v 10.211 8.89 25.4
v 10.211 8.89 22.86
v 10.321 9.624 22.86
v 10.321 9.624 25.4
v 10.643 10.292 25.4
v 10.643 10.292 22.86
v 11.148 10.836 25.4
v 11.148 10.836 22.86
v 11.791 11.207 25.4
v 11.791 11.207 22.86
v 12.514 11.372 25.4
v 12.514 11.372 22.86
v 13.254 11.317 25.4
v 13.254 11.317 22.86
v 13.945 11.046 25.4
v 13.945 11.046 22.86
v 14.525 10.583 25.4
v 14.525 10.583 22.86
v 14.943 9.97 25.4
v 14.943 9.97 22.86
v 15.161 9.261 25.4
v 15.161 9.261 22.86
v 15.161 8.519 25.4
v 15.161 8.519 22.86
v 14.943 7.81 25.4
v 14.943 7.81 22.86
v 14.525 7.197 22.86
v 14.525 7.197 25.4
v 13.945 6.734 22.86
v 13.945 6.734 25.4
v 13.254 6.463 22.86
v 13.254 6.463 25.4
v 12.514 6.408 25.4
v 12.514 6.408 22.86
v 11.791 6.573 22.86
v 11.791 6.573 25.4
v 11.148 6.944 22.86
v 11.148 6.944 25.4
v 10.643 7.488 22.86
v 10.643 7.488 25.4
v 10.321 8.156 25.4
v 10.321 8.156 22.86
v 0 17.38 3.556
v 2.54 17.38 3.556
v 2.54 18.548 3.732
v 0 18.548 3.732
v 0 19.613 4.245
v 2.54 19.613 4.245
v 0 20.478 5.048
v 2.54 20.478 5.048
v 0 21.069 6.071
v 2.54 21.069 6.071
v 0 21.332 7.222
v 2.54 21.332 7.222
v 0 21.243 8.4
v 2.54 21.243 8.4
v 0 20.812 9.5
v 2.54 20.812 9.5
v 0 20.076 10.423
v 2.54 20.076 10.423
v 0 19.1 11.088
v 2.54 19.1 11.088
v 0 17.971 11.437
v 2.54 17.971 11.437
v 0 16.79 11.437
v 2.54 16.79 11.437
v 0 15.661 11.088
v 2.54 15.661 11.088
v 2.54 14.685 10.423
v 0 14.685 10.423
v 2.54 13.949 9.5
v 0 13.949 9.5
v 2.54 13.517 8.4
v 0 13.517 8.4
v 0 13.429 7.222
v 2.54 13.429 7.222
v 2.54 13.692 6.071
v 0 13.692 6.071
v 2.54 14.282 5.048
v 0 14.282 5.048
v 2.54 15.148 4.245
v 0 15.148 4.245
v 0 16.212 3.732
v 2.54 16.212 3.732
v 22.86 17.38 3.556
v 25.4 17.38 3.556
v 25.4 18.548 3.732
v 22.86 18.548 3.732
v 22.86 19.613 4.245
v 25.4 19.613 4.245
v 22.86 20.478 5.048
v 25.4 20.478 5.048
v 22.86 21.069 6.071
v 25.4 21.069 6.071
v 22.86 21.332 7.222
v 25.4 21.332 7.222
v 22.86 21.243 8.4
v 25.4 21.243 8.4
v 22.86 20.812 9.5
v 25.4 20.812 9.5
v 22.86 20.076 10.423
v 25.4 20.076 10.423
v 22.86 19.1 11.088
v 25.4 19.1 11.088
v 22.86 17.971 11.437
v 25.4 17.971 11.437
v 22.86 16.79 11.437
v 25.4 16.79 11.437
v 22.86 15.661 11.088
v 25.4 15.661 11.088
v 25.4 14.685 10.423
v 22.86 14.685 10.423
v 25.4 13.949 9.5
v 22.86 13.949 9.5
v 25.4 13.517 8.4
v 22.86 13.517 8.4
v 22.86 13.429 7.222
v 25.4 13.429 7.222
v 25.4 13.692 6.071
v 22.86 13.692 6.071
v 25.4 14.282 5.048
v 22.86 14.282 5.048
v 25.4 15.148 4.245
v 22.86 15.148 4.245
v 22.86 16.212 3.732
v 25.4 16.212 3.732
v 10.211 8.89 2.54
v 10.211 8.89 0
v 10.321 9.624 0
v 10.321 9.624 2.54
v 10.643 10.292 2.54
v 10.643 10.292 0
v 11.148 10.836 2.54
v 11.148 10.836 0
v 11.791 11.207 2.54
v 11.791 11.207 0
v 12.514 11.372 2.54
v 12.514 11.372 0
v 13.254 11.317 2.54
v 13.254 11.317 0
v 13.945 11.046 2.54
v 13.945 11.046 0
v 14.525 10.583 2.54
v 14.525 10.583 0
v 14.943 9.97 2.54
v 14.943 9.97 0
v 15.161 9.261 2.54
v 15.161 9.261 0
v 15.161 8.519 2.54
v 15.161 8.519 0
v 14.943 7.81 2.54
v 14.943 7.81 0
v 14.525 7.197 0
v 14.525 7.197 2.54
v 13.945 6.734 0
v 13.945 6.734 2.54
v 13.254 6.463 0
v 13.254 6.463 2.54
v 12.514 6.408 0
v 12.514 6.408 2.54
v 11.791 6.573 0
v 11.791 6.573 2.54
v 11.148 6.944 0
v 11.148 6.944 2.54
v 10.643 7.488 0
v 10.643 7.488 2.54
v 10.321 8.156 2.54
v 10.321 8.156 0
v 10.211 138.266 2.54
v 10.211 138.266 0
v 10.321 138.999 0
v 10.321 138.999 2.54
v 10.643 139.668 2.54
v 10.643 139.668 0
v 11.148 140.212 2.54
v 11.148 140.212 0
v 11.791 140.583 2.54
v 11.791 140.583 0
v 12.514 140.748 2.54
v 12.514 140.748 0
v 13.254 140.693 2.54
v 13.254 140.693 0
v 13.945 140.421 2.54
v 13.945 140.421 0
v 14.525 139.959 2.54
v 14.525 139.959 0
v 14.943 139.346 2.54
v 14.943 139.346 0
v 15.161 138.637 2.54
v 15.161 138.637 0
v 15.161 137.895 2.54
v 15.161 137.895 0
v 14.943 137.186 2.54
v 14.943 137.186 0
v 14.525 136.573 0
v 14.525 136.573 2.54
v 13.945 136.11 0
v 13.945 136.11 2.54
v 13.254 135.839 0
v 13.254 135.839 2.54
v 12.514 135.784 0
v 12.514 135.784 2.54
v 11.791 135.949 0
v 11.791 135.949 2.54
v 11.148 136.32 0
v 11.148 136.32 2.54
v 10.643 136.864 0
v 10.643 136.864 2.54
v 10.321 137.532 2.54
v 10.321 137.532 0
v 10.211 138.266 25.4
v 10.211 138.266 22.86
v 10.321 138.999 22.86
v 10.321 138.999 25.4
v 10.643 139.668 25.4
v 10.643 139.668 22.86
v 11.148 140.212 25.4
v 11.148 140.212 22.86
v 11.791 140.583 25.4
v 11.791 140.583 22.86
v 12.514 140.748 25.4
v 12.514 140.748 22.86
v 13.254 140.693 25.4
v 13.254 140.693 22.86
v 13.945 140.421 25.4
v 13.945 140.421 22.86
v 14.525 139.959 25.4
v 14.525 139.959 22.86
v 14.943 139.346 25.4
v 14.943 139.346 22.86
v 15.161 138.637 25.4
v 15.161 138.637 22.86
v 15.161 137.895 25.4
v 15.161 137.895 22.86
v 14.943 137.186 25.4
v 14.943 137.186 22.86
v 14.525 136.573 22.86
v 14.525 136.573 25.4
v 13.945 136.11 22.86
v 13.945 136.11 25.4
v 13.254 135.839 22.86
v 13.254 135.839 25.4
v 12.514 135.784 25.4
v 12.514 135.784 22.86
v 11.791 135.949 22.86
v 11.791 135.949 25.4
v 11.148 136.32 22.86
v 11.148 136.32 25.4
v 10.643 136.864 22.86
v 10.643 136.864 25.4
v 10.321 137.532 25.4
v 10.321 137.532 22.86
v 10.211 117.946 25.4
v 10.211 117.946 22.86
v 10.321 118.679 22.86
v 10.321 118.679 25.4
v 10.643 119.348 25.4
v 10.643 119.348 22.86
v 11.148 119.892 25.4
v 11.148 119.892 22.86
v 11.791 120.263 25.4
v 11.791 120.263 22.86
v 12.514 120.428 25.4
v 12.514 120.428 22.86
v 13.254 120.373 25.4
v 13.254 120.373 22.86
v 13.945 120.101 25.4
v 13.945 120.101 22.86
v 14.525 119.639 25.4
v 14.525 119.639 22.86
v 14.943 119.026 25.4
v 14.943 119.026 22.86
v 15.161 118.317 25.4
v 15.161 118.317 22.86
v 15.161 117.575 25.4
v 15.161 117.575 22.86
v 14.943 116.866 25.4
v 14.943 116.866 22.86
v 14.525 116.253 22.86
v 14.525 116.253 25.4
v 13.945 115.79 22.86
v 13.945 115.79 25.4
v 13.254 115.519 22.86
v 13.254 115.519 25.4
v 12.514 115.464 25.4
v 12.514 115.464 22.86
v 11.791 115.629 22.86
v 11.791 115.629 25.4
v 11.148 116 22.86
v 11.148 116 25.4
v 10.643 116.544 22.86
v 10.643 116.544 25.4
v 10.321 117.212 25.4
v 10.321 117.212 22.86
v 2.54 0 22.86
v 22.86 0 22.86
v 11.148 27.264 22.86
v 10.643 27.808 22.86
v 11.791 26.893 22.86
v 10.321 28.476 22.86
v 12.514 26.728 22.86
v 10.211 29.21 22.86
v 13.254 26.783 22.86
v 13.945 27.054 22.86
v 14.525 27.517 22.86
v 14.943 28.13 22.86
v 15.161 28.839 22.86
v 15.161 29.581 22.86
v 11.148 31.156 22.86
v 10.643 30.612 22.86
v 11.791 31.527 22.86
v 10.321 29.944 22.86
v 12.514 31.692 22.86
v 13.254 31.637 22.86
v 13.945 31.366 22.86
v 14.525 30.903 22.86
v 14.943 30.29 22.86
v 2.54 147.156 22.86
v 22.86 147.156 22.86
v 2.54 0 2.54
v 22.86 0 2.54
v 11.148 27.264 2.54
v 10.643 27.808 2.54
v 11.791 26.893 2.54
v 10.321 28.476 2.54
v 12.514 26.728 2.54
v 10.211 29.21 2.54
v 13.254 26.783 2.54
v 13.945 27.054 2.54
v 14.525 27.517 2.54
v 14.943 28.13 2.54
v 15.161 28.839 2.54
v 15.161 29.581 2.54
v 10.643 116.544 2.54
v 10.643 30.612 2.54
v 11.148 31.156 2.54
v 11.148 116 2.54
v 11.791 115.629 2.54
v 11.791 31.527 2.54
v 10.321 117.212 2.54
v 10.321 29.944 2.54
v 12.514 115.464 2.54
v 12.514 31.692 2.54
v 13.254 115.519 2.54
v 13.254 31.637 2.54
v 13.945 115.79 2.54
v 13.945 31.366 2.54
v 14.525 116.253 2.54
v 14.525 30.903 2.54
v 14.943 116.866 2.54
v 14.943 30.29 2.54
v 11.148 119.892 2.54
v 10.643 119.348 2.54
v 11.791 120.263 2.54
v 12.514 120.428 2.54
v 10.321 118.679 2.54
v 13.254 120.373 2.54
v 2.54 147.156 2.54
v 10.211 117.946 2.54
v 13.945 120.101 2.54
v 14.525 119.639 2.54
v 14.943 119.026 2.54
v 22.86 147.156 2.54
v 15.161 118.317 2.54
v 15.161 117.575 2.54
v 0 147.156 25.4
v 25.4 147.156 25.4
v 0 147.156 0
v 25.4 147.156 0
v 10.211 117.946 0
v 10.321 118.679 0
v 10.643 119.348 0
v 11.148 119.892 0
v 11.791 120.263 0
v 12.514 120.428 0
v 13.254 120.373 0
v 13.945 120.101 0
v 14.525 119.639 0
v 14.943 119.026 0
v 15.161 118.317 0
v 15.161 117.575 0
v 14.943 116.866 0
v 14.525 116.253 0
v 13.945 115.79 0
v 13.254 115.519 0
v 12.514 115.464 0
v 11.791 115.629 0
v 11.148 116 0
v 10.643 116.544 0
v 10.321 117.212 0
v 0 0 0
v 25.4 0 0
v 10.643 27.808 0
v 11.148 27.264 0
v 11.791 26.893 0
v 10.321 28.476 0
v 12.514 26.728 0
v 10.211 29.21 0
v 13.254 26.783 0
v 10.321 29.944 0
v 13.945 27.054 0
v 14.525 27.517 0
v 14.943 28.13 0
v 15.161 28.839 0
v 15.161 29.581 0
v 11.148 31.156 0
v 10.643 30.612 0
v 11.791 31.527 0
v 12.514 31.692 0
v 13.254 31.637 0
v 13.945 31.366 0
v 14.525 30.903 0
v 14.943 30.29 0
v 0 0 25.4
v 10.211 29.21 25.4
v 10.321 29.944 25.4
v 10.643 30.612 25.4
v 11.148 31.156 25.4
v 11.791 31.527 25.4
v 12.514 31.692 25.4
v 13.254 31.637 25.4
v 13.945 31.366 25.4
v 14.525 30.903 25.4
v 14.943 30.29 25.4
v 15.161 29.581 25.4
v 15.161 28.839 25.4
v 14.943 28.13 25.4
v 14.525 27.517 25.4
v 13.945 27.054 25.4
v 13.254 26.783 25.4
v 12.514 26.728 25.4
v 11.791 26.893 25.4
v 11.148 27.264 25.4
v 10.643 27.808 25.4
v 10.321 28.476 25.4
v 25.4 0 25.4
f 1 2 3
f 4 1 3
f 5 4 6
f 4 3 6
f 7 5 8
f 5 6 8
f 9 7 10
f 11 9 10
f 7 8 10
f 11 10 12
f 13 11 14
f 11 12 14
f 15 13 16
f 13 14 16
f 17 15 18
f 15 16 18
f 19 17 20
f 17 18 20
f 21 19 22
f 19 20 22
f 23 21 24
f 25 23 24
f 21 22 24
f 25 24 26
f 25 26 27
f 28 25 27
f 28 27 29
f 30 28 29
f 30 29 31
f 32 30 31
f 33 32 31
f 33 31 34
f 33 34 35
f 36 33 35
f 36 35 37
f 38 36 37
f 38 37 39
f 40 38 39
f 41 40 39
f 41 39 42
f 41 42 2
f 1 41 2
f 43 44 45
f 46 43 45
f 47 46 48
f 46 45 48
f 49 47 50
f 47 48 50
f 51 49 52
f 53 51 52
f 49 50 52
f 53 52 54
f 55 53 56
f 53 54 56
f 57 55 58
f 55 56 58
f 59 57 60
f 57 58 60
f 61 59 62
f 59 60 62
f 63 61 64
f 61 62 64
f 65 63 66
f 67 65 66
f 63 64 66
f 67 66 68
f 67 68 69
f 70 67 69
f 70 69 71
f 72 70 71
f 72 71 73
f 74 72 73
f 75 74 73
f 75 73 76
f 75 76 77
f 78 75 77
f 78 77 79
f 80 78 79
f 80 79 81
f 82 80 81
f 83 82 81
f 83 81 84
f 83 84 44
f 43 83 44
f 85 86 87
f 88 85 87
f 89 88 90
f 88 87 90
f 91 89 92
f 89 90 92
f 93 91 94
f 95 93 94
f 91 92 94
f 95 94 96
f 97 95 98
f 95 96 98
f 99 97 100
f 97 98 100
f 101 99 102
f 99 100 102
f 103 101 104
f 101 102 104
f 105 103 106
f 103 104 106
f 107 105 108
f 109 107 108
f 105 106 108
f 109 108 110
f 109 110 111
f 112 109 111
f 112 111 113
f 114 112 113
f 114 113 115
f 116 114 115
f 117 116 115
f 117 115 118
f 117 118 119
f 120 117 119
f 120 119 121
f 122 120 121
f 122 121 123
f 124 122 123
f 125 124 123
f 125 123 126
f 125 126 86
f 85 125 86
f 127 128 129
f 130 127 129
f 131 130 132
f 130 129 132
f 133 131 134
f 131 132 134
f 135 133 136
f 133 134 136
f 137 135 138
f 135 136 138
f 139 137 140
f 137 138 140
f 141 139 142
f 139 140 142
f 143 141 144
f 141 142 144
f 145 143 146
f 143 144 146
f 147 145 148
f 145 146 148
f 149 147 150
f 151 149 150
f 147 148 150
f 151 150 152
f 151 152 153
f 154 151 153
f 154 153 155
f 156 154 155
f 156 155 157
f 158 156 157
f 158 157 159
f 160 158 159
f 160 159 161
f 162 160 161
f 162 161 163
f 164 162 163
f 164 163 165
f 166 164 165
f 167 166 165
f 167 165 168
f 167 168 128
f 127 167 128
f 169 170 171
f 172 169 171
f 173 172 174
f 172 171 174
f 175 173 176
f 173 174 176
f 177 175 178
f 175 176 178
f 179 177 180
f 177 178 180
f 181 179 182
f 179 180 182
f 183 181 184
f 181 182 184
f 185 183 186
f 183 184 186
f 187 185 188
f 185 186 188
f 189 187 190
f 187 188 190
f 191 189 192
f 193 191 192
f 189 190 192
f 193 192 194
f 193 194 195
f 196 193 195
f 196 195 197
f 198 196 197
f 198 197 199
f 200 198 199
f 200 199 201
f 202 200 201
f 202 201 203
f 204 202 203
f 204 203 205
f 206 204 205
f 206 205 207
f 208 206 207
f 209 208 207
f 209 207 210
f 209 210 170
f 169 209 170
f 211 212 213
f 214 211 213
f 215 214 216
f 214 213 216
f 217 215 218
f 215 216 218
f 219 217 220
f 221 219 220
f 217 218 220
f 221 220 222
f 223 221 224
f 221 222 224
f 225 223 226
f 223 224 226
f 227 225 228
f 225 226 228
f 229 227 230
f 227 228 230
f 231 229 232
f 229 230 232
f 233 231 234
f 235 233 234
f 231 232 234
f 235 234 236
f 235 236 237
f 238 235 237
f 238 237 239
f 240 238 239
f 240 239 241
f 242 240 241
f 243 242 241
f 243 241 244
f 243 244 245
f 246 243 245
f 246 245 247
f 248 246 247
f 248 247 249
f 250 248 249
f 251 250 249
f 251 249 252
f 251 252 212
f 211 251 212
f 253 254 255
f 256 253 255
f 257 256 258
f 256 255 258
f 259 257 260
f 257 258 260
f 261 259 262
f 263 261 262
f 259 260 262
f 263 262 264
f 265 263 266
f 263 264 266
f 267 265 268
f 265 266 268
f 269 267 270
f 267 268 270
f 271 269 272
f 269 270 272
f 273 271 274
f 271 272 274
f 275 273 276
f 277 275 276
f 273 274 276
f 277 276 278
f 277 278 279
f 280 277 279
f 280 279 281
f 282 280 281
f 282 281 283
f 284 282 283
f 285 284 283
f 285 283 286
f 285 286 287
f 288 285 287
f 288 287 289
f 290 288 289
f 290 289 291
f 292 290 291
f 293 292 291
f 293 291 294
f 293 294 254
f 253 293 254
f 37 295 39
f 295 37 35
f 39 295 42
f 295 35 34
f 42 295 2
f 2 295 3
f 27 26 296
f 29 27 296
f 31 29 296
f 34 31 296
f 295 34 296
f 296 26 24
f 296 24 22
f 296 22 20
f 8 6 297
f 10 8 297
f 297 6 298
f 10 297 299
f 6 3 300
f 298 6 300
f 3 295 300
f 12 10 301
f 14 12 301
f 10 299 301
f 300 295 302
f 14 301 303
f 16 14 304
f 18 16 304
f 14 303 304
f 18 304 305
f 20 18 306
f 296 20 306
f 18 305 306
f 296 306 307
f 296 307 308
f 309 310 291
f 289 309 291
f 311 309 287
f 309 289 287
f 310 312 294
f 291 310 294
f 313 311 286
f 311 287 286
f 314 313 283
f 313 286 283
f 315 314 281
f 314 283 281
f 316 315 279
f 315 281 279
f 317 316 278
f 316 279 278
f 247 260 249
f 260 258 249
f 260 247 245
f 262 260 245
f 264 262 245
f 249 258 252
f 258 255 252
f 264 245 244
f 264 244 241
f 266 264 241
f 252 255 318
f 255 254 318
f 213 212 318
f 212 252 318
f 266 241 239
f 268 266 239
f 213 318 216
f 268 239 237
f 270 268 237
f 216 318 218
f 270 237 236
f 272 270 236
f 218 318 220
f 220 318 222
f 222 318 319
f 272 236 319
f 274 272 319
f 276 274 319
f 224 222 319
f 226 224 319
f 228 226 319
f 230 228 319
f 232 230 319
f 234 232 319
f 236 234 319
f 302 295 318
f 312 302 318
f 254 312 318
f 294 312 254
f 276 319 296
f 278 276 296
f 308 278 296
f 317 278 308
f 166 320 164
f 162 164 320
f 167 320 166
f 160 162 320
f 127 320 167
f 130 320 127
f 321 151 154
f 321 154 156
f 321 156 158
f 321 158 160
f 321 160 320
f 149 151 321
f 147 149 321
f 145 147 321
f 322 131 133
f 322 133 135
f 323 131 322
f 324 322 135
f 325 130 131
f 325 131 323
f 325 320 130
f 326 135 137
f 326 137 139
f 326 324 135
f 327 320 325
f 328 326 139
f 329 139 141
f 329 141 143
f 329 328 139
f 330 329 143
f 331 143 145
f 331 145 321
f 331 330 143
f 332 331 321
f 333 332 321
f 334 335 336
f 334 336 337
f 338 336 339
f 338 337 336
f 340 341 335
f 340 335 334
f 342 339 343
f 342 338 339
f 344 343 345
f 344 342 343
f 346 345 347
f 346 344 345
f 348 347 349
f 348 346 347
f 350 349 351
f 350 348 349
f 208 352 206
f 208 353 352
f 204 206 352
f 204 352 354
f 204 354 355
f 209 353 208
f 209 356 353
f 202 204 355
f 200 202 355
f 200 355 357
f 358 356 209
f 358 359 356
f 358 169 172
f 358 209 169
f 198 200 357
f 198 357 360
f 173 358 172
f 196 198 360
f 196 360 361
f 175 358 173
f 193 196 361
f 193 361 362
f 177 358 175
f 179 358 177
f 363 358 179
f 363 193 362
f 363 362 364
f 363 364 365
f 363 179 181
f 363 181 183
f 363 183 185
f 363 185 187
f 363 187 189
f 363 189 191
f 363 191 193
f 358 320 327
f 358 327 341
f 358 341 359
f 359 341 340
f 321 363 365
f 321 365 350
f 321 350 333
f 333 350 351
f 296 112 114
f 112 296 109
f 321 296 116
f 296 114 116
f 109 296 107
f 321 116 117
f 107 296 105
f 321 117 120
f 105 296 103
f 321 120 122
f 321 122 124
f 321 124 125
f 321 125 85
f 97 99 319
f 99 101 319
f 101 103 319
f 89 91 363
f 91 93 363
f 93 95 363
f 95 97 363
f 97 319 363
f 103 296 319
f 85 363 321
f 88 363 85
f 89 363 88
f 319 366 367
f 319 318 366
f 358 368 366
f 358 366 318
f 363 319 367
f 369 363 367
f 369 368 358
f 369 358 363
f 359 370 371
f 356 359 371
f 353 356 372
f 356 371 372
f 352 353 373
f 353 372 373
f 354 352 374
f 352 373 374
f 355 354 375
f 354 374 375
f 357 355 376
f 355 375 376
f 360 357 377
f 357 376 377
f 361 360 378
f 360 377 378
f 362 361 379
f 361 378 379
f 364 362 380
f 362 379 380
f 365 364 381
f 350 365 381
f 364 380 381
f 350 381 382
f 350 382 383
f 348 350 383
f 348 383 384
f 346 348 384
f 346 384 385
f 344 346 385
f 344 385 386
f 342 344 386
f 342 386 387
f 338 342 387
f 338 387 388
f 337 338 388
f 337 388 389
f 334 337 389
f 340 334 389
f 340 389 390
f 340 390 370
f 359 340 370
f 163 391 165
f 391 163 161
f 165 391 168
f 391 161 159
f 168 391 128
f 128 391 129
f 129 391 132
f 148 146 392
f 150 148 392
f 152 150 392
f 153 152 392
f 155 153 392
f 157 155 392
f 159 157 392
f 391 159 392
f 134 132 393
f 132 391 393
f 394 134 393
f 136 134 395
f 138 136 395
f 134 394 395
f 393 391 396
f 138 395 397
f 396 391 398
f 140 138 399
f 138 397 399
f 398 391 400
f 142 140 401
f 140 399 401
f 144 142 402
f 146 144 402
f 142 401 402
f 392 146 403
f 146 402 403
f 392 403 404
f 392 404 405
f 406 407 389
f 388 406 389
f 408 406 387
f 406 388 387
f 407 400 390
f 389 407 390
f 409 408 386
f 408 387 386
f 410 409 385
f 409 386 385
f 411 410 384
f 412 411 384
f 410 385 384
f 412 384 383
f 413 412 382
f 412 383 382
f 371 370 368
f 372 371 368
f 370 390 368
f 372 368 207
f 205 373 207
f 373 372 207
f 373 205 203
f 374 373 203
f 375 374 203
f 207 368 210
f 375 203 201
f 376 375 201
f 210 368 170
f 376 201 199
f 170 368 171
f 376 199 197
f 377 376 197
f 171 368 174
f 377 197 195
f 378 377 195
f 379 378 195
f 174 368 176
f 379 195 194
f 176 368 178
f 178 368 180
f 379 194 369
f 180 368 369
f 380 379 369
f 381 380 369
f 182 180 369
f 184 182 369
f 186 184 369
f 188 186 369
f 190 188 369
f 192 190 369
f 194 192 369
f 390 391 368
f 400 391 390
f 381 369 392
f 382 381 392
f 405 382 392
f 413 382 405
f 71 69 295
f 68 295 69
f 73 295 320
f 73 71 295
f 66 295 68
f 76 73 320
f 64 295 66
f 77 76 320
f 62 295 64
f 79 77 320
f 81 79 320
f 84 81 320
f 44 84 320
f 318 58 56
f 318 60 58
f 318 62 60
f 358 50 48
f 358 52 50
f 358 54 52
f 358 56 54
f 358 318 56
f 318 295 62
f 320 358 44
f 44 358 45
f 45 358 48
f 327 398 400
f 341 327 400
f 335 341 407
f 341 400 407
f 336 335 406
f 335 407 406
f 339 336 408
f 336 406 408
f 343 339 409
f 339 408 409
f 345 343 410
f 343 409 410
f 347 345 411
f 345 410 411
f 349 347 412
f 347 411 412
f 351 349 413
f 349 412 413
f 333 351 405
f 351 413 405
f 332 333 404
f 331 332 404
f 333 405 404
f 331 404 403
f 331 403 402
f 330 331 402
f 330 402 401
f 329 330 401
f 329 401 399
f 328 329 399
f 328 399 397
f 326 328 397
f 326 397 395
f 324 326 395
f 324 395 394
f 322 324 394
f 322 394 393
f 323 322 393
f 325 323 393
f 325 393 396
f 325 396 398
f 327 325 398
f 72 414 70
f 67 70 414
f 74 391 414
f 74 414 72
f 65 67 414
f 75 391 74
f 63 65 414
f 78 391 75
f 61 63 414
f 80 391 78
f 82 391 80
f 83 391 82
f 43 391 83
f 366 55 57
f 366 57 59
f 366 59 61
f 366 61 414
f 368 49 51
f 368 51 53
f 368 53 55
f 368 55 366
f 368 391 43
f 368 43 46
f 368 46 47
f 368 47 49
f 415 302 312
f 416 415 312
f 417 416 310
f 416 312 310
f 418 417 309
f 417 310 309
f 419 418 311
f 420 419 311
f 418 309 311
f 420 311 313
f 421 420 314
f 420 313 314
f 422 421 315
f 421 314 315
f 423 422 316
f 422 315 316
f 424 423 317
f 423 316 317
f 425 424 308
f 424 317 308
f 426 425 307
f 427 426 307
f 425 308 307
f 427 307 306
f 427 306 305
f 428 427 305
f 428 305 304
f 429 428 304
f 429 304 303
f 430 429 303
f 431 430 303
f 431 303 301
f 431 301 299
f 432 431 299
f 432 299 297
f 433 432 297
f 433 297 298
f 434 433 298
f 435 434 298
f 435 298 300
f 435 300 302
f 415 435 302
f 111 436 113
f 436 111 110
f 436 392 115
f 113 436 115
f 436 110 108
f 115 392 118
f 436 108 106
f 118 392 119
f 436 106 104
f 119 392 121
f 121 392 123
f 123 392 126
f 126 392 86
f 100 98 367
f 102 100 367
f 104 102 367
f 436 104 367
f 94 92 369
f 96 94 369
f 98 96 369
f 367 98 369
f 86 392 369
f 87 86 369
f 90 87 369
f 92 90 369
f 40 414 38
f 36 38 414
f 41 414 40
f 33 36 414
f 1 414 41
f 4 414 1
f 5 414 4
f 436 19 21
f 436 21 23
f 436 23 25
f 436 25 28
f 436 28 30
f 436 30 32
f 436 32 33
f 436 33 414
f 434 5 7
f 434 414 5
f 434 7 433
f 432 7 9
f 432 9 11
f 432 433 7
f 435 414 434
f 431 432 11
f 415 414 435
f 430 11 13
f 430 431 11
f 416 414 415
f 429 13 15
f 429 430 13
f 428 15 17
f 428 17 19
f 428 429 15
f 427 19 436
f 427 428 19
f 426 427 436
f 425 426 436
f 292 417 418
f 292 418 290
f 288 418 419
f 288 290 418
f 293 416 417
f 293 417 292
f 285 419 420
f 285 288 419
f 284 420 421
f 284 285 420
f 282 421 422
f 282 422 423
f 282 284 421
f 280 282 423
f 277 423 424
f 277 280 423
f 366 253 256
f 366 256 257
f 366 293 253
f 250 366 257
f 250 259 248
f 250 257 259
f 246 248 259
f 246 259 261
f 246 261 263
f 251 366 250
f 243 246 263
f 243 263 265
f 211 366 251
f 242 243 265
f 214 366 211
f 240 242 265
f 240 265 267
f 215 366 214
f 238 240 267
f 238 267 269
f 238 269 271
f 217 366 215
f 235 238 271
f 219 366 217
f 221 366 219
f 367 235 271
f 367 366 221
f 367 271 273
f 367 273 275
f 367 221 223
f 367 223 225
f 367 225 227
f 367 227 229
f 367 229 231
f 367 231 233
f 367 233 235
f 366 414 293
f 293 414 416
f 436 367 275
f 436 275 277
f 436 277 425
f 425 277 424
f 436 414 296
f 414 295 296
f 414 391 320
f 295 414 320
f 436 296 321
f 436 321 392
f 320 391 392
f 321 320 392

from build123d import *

# Parameters (mm, degrees)
SKETCH1_W           = 25.4
SKETCH1_H           = 147.155789
BOSS_EXTRUDE1_DEPTH = 25.4
SKETCH2_W           = 20.32
SKETCH2_H           = 20.32
CUT_EXTRUDE1_DEPTH  = 148.155789
SKETCH3_R           = 2.4892
CUT_EXTRUDE2_DEPTH  = 26.4
SKETCH5_R           = 3.9624
CUT_EXTRUDE3_DEPTH  = 26.4


with BuildPart() as part:
    # Sketch1 → Boss-Extrude1 (new body)
    with BuildSketch(Plane.XY):
        with Locations((12.7, 73.5778945)):
            Rectangle(SKETCH1_W, SKETCH1_H)
    extrude(amount=BOSS_EXTRUDE1_DEPTH)

    # Sketch2 → Cut-Extrude1 (cut, through all)
    with BuildSketch(Plane(origin=(0, 147.155789, 0), x_dir=(1, 0, 0), z_dir=(0, 1, 0))):
        with Locations((12.7, -12.7)):
            Rectangle(SKETCH2_W, SKETCH2_H)
    extrude(amount=-CUT_EXTRUDE1_DEPTH, mode=Mode.SUBTRACT)

    # Sketch3 → Cut-Extrude2 (cut, through all)
    with BuildSketch(Plane(origin=(0, 0, 0), x_dir=(-1, 0, 0), z_dir=(0, 0, -1))):
        with Locations((-12.7, 138.265789)):
            Circle(SKETCH3_R)
        with Locations((-12.7, 117.945789)):
            Circle(SKETCH3_R)
        with Locations((-12.7, 29.21)):
            Circle(SKETCH3_R)
        with Locations((-12.7, 8.89)):
            Circle(SKETCH3_R)
    extrude(amount=-CUT_EXTRUDE2_DEPTH, mode=Mode.SUBTRACT)

    # Sketch5 → Cut-Extrude3 (cut, through all)
    with BuildSketch(Plane(origin=(25.4, 0, 0), x_dir=(0, 0, -1), z_dir=(1, 0, 0))):
        with Locations((-7.5184, 17.3804072)):
            Circle(SKETCH5_R)
    extrude(amount=-CUT_EXTRUDE3_DEPTH, mode=Mode.SUBTRACT)


solid = part.part
